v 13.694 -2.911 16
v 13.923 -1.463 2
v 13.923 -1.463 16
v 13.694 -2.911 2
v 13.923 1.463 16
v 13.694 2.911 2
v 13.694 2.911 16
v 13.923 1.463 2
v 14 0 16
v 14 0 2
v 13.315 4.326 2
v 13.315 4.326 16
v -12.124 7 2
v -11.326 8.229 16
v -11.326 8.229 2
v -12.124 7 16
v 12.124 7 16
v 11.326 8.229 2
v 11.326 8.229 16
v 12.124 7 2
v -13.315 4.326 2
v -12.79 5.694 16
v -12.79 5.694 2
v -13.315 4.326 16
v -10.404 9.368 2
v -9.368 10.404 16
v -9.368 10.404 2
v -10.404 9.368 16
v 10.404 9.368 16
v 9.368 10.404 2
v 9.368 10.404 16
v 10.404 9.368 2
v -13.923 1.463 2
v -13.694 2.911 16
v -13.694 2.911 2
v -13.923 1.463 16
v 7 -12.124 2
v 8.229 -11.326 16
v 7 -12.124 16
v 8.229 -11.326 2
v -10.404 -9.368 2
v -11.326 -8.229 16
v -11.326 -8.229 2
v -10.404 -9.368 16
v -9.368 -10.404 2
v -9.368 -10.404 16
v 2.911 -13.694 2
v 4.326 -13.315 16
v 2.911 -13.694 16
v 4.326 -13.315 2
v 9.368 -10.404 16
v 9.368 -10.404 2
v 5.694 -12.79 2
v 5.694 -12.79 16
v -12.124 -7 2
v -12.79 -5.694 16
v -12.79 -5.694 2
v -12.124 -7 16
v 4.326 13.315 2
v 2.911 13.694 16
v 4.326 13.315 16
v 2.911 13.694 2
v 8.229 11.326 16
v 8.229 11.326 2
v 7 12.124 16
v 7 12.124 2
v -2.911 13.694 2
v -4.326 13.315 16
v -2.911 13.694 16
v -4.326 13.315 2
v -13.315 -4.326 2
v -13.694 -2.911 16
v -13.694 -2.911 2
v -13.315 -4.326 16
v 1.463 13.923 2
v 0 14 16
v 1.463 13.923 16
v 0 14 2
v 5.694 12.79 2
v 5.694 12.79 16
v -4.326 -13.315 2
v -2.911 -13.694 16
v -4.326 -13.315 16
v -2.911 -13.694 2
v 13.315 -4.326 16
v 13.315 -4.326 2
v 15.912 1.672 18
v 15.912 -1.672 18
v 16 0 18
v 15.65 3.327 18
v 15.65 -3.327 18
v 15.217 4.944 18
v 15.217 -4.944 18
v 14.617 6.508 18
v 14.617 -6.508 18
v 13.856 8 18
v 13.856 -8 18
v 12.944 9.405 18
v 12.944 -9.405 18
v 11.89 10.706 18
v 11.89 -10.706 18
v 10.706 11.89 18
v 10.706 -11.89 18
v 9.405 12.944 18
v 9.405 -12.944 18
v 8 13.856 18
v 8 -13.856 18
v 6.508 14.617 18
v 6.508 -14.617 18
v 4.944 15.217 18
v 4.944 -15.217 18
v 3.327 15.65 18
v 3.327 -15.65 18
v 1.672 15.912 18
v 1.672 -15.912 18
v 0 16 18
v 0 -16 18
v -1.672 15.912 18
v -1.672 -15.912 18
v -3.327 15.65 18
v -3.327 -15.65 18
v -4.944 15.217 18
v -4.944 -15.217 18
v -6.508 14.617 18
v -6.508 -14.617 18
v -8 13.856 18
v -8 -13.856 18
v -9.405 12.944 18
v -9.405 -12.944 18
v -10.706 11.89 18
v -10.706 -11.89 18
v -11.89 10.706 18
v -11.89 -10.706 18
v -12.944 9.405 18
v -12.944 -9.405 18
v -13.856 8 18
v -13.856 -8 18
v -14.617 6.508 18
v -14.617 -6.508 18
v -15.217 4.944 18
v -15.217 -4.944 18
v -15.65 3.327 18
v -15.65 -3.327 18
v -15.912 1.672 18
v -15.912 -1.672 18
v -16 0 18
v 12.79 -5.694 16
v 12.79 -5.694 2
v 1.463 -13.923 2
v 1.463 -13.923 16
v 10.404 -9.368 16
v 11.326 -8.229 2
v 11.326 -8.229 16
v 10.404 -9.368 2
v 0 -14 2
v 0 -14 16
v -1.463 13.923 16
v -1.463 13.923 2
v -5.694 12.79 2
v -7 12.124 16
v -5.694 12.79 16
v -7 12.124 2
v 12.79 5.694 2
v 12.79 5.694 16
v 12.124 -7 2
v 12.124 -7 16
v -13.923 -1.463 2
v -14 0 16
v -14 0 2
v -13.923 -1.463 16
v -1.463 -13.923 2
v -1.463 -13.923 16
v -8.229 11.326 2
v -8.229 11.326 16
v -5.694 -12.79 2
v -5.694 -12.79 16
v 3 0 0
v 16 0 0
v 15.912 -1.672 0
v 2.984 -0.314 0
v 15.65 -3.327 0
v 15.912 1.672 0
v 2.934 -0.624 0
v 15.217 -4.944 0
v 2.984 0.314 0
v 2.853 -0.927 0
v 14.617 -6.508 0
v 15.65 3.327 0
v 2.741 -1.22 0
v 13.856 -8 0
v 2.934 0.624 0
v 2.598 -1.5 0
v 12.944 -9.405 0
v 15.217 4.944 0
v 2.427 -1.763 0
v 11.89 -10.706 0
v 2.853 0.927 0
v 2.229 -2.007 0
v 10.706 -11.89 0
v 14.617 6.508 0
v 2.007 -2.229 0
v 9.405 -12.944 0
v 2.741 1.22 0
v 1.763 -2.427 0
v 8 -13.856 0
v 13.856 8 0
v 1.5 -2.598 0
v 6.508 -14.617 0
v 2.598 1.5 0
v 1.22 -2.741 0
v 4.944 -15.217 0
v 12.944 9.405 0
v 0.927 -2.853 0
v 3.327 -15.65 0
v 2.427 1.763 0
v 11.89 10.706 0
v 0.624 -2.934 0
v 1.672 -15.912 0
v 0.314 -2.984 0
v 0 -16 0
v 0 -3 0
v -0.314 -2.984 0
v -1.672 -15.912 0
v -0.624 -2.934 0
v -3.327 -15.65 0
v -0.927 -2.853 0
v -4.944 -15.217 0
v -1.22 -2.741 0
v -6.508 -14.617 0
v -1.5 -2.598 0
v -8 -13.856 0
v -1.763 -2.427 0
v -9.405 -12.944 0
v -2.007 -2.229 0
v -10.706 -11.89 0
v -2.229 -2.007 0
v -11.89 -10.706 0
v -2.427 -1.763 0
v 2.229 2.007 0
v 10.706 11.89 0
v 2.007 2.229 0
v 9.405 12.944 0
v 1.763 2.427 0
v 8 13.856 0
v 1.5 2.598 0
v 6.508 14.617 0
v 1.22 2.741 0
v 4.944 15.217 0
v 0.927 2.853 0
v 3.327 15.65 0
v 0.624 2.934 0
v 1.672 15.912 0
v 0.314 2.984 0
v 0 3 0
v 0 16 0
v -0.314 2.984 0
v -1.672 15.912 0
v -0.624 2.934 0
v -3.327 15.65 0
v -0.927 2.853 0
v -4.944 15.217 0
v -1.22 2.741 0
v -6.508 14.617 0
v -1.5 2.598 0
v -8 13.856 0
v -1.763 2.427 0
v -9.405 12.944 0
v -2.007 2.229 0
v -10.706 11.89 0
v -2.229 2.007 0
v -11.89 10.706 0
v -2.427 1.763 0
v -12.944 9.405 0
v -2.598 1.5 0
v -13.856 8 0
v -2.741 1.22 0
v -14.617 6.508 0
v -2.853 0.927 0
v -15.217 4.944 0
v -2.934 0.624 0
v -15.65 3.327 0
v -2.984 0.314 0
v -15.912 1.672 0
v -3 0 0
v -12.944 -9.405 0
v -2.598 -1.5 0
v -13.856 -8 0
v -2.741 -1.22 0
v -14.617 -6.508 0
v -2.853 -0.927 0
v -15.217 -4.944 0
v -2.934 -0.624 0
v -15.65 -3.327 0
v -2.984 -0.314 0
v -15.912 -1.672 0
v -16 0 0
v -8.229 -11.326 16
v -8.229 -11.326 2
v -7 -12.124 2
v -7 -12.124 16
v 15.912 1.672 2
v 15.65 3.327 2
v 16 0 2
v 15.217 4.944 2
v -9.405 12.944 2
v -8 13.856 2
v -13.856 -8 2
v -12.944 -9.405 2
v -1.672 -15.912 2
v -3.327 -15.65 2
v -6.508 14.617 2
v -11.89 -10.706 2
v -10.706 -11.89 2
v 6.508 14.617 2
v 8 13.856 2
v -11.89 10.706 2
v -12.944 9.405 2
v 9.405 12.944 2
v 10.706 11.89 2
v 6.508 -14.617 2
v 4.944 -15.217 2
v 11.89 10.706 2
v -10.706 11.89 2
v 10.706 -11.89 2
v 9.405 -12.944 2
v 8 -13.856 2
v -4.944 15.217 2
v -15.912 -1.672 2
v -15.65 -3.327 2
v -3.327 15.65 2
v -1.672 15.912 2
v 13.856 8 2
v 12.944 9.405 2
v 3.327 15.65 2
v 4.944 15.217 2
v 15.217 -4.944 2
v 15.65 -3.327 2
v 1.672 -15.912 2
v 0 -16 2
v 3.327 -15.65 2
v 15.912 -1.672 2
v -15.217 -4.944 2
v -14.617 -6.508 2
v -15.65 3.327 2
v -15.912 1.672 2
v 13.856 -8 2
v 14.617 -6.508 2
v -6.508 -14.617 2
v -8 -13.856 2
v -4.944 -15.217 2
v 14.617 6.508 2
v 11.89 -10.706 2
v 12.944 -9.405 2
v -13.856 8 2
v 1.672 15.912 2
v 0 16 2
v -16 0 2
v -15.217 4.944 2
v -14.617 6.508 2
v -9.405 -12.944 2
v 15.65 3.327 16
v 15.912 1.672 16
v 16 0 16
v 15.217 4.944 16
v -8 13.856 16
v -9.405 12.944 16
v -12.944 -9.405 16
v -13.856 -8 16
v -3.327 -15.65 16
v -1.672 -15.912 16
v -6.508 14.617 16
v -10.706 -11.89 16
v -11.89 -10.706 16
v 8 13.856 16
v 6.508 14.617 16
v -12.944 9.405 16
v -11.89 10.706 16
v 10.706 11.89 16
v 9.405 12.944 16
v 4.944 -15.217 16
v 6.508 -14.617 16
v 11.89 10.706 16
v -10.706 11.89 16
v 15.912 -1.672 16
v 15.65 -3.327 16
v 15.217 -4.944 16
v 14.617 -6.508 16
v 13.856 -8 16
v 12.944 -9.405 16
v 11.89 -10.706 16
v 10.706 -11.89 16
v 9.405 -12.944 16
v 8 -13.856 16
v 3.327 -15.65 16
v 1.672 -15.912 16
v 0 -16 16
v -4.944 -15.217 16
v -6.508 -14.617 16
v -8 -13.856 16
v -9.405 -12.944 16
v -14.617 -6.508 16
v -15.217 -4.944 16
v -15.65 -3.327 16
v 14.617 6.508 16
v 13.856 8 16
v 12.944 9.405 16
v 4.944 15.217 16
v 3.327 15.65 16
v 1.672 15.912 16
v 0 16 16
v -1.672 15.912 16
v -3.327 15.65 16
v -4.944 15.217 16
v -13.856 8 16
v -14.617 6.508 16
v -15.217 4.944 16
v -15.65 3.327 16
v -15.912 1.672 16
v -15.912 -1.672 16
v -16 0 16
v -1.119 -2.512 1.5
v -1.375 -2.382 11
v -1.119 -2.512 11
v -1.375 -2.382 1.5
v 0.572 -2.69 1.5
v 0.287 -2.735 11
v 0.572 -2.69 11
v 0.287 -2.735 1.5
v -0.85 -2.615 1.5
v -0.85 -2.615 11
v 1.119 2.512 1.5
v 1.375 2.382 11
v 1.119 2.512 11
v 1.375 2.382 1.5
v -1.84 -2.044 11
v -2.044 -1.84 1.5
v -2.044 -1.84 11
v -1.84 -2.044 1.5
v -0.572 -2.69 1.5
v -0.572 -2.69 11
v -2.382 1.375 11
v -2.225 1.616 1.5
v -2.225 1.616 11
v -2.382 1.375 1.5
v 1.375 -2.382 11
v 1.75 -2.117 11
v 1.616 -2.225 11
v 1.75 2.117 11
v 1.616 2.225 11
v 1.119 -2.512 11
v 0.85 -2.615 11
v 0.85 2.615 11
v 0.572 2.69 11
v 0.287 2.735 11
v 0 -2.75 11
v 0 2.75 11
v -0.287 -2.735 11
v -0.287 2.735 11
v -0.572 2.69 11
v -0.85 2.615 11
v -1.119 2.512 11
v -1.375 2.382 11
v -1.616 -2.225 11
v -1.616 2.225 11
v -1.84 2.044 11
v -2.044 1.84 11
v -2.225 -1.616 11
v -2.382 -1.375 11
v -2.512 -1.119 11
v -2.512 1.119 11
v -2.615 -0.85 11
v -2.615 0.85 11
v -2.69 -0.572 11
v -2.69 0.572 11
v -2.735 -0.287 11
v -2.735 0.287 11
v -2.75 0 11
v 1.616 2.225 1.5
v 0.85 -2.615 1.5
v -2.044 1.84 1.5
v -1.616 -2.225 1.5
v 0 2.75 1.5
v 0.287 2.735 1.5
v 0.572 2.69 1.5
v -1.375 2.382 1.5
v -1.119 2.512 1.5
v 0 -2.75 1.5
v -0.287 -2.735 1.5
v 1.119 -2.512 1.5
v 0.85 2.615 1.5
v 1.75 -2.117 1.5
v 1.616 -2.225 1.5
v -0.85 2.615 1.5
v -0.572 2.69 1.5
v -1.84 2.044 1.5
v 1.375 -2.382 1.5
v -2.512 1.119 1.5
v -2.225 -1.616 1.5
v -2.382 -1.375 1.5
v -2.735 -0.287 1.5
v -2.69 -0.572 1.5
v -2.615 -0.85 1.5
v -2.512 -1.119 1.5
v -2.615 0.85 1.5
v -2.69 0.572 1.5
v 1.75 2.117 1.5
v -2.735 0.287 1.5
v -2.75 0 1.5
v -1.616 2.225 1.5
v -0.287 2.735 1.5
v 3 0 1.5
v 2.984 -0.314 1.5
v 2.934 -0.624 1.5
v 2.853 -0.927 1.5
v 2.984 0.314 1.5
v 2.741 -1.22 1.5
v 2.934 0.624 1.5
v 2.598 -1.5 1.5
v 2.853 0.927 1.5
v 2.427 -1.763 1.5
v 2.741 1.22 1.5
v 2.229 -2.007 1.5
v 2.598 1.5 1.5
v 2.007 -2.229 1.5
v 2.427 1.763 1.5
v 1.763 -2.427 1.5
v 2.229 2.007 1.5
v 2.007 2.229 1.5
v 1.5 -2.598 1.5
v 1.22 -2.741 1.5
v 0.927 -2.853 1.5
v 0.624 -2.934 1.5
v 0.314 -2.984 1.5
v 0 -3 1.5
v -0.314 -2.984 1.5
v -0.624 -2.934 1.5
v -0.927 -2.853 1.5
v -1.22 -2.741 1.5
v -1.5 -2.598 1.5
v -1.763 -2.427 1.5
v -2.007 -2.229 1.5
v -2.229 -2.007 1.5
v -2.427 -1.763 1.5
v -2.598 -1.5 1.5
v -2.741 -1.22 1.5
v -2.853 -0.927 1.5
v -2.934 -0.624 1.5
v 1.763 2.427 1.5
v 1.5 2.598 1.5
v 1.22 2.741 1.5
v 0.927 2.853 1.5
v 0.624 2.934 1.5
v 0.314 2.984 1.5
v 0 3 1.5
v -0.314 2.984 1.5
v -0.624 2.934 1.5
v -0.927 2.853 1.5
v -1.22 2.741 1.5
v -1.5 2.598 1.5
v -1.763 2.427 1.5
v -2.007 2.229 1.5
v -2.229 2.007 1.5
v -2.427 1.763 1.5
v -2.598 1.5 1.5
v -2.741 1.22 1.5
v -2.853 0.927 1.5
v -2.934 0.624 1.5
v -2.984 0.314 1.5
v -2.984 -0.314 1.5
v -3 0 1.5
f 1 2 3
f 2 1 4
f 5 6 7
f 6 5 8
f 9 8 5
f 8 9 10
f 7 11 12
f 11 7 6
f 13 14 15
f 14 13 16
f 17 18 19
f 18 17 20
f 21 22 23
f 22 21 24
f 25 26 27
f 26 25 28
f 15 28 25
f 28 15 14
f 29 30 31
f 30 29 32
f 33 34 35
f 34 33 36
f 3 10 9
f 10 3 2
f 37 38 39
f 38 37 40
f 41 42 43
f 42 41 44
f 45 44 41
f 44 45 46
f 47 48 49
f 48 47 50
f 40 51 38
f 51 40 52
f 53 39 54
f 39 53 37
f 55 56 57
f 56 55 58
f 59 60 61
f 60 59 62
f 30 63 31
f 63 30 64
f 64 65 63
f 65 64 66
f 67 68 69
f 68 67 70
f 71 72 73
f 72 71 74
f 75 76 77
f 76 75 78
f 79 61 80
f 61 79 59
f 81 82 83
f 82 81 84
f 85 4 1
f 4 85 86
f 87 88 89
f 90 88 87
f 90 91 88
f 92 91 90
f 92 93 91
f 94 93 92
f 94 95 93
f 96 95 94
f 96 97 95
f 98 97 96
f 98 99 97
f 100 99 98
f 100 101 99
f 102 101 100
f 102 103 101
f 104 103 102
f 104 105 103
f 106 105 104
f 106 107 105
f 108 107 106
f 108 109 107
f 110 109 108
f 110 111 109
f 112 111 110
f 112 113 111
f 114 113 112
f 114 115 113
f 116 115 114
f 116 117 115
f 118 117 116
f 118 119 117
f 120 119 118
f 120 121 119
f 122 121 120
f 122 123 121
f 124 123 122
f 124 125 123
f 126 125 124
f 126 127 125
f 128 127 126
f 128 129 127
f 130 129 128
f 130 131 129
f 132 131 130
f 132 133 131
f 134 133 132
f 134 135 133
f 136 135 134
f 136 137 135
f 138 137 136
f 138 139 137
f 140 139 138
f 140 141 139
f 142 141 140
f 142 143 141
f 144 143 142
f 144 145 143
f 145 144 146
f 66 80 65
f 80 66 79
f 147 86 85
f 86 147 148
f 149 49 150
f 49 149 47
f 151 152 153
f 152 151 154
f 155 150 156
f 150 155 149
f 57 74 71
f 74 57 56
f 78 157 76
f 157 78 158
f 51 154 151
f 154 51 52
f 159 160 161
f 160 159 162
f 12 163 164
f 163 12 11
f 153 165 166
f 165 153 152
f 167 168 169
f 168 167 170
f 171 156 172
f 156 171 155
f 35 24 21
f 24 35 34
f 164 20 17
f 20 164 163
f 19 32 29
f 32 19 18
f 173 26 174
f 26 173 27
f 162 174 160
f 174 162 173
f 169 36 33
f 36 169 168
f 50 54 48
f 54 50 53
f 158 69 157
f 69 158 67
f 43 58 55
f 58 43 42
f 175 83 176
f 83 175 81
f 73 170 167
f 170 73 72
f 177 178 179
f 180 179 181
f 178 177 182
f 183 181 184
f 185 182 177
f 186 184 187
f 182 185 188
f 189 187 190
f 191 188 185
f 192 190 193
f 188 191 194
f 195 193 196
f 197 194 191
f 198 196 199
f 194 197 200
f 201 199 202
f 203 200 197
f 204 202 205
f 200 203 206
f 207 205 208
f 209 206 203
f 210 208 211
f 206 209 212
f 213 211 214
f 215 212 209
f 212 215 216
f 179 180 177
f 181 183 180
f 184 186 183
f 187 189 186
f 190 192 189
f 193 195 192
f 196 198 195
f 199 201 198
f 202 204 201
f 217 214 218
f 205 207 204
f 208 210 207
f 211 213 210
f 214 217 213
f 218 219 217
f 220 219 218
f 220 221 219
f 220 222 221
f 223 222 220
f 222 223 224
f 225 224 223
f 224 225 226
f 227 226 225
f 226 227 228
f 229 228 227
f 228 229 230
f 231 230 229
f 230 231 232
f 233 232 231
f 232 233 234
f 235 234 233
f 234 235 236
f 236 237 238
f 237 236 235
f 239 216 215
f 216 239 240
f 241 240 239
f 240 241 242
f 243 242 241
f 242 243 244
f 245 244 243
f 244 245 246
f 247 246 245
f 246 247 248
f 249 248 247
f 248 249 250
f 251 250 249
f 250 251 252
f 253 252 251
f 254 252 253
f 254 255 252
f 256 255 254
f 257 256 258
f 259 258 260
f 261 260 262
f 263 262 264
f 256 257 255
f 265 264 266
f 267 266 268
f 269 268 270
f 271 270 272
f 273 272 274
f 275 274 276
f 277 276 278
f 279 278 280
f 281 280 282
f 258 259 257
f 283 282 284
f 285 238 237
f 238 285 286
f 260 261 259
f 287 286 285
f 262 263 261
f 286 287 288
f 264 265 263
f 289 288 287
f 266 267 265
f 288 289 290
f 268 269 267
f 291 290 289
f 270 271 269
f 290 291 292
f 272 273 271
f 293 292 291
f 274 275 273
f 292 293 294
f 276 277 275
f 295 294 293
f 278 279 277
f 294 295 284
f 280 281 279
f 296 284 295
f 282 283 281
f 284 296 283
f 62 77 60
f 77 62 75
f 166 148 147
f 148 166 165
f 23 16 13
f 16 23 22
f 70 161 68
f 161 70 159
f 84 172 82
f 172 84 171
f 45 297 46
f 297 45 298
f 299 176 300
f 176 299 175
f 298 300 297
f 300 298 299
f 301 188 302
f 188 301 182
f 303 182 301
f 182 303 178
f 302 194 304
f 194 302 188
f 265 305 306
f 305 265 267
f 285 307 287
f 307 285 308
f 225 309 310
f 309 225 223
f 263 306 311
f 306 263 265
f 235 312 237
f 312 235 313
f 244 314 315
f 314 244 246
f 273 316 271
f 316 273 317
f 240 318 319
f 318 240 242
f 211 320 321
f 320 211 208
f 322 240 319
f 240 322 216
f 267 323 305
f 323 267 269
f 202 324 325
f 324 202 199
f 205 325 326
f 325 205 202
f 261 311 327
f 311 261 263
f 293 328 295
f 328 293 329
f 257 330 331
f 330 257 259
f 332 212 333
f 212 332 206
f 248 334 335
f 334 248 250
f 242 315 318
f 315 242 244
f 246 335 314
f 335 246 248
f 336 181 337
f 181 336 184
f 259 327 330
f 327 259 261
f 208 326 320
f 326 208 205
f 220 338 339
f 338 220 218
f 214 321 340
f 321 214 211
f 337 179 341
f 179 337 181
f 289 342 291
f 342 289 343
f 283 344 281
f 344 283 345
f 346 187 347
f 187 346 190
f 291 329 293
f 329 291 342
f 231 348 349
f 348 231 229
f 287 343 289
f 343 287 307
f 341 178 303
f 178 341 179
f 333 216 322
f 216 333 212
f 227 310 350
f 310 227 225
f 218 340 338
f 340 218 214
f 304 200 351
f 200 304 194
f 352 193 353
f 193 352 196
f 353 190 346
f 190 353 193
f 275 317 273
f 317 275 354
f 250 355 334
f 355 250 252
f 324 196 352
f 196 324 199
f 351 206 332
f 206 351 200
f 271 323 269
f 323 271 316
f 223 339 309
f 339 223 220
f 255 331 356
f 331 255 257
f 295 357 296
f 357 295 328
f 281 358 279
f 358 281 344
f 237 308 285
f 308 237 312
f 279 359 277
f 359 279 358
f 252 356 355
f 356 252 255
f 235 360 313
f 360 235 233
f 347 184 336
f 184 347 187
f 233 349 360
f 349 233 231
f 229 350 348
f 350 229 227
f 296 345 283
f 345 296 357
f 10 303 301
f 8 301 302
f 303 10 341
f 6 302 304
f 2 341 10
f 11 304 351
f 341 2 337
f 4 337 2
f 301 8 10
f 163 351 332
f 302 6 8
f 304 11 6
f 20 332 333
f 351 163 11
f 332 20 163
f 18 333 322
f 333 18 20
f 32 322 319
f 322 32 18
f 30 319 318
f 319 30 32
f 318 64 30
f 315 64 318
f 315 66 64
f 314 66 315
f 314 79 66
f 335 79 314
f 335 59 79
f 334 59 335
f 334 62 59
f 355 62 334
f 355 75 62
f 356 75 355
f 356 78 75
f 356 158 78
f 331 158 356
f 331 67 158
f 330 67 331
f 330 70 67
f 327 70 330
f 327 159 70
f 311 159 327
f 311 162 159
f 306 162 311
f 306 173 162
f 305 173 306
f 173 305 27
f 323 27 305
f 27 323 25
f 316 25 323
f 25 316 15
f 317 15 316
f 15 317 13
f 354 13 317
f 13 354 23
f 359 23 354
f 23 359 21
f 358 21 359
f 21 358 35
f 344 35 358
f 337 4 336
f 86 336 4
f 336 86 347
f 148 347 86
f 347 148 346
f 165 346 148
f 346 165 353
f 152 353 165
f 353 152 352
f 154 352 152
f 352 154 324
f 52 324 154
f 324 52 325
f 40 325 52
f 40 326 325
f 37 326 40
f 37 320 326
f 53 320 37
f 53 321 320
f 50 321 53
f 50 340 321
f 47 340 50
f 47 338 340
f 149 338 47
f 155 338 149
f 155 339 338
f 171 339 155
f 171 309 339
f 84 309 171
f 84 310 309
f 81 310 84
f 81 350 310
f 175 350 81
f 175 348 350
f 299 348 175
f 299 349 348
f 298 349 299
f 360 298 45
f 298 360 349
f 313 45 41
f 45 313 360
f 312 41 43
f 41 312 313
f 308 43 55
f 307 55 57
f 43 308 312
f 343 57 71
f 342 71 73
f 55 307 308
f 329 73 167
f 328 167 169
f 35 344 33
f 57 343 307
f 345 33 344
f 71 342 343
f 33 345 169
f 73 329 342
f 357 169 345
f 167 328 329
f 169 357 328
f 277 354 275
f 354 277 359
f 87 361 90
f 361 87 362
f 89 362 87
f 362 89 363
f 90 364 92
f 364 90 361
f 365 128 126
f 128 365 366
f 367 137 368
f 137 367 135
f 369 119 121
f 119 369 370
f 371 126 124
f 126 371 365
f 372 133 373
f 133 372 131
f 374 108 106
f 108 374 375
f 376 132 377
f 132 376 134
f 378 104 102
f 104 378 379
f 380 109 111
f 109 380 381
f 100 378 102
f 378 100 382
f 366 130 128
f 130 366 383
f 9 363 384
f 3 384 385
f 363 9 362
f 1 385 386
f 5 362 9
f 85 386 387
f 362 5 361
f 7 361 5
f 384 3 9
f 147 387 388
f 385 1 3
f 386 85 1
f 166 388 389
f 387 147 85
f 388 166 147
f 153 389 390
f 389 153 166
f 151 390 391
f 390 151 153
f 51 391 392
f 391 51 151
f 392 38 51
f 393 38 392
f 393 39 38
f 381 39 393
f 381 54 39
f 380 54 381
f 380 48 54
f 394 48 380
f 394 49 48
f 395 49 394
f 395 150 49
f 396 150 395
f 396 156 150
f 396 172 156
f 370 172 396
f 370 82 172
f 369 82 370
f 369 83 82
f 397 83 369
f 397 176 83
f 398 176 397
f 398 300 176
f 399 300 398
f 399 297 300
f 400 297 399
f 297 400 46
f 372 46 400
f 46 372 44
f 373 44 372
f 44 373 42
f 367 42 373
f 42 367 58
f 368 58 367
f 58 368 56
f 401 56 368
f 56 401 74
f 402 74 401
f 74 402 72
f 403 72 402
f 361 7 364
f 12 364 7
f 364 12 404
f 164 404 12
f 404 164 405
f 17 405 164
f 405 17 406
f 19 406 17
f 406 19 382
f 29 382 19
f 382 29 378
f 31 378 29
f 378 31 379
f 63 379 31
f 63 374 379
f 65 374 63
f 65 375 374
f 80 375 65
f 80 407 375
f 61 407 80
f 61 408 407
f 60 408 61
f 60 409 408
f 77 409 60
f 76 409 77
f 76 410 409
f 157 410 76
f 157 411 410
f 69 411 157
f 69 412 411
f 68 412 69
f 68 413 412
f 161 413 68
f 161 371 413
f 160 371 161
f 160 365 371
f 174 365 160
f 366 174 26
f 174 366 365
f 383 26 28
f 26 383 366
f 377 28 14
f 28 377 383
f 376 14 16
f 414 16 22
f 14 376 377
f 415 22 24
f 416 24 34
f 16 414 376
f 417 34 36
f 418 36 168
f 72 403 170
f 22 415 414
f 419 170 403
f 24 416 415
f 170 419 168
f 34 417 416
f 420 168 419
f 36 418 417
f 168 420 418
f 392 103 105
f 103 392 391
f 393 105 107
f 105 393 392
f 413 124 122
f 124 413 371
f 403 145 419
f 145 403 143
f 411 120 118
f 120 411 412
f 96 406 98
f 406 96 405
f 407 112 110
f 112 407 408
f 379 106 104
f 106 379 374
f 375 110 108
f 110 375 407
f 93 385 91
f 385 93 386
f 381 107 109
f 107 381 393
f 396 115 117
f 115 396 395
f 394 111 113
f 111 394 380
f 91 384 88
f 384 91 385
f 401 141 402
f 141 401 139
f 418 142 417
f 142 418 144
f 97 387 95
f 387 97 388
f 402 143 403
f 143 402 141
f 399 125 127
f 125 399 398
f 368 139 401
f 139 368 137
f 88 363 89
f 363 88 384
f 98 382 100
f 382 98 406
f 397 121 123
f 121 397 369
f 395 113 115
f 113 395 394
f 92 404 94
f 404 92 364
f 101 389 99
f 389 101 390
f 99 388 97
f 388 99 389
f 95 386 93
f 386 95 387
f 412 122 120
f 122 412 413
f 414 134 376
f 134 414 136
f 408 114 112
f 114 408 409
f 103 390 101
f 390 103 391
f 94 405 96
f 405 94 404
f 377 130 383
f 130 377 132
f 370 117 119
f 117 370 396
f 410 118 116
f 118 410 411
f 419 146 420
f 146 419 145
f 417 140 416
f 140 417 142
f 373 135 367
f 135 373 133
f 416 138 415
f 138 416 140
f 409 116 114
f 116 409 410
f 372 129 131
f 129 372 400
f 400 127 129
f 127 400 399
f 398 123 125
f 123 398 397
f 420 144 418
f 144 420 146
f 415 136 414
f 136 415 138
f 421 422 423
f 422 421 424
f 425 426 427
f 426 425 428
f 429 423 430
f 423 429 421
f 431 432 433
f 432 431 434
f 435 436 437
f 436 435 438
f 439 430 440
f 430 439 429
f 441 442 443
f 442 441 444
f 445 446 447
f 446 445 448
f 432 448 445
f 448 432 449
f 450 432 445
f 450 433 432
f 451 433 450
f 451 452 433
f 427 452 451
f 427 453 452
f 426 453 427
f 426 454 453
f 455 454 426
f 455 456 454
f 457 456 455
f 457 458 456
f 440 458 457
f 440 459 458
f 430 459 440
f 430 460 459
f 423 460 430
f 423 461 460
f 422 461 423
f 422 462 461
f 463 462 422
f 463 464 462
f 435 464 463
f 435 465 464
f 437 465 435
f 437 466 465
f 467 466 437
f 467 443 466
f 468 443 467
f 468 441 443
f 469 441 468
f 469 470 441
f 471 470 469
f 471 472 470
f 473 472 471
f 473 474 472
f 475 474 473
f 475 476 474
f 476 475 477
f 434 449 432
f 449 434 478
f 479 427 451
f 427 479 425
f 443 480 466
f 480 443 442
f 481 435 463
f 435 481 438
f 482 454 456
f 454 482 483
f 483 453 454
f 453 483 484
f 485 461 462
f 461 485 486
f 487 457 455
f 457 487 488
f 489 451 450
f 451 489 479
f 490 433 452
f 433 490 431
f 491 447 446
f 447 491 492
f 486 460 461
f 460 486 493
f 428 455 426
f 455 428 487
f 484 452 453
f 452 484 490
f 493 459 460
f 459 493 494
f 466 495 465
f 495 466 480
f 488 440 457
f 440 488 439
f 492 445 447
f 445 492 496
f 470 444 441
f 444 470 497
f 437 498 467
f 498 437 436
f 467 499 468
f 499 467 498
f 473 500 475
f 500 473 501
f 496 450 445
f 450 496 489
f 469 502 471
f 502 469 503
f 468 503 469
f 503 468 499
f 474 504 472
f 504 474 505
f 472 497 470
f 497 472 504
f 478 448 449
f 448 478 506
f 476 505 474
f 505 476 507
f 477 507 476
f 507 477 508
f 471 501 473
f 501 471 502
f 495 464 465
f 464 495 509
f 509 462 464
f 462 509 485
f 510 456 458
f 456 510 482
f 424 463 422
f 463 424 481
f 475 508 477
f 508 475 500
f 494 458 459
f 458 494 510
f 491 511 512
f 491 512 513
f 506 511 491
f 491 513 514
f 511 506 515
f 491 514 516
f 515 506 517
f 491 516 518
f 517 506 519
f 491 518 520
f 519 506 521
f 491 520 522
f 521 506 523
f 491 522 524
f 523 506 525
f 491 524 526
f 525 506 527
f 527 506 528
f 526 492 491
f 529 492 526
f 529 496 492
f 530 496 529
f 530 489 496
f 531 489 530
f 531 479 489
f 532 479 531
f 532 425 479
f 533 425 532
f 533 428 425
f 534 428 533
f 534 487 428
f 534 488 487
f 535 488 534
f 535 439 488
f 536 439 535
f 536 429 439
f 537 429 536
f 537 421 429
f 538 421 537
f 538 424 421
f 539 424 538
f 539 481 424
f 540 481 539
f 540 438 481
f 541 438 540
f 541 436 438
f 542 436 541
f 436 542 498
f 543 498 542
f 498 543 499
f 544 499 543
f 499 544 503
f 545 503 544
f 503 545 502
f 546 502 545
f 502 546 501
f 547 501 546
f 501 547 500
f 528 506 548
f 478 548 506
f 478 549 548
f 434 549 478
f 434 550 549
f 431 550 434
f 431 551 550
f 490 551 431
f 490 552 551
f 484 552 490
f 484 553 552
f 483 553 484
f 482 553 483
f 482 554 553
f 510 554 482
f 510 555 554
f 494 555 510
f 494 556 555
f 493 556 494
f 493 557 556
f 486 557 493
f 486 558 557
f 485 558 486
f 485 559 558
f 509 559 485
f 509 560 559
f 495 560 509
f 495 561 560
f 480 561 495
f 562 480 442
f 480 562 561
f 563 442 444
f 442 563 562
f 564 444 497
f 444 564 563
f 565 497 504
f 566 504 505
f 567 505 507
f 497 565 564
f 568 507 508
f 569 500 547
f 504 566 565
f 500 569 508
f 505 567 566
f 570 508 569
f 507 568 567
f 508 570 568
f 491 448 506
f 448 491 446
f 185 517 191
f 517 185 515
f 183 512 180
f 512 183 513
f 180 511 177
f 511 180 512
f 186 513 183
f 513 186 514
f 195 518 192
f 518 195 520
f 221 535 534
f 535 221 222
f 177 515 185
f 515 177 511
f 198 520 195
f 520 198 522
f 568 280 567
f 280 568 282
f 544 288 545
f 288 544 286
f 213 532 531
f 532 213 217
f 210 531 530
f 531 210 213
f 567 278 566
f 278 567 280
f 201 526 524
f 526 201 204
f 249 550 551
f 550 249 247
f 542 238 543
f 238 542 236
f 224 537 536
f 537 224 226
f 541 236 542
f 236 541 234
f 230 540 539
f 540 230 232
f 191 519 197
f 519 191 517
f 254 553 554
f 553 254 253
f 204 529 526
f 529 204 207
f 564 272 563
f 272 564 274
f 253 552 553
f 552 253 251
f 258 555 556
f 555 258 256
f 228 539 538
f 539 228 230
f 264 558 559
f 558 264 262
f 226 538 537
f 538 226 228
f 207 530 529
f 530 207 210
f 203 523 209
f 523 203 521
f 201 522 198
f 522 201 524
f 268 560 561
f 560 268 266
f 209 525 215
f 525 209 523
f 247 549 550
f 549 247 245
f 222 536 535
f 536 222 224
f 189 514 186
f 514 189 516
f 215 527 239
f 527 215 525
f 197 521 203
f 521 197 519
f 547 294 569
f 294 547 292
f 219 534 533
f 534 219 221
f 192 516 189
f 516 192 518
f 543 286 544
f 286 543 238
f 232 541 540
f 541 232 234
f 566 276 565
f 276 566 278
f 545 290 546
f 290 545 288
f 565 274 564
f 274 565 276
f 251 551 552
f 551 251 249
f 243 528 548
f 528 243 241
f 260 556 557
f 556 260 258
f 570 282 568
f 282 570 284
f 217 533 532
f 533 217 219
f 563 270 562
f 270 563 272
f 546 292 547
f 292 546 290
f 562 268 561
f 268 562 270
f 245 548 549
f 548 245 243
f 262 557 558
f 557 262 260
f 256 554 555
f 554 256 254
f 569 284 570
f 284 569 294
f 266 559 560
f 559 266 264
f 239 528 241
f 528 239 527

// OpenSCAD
shaft_radius_base=  3.0;
shaft_radius=  2.75;
shaft_length= 11;
flat_depht= 1.0;
flat_length= 9.5;

pulley_radius= 14;
pulley_length= 18;
pulley_bump_height= 2.0;
pulley_bump_length= 2.0;

$fn=60;

module shaft(){
    union(){
        //base of the shaft
        translate(v = [0,0, flat_length]) 
            cylinder(h = shaft_length-flat_length, r = shaft_radius_base);
        //tip of the shaft
        difference() {
            cylinder(h = shaft_length, r = shaft_radius);
            translate(v = [shaft_radius-flat_depht,-shaft_radius,0]) 
                cube([2*shaft_radius, 2*shaft_radius, flat_length]);
        }
    }
}

module pulley(){
    cylinder(h = pulley_length, r = pulley_radius);
    cylinder(h = pulley_bump_length, r = pulley_radius+pulley_bump_height);
    translate(v = [0,0,pulley_length-pulley_bump_length])
        cylinder(h = pulley_bump_length, r = pulley_radius+pulley_bump_height);
}

difference() {
pulley();
translate(v = [0,0,shaft_length]) 
    rotate(a = 180, v = [1,0,0]) 
        shaft();
}
